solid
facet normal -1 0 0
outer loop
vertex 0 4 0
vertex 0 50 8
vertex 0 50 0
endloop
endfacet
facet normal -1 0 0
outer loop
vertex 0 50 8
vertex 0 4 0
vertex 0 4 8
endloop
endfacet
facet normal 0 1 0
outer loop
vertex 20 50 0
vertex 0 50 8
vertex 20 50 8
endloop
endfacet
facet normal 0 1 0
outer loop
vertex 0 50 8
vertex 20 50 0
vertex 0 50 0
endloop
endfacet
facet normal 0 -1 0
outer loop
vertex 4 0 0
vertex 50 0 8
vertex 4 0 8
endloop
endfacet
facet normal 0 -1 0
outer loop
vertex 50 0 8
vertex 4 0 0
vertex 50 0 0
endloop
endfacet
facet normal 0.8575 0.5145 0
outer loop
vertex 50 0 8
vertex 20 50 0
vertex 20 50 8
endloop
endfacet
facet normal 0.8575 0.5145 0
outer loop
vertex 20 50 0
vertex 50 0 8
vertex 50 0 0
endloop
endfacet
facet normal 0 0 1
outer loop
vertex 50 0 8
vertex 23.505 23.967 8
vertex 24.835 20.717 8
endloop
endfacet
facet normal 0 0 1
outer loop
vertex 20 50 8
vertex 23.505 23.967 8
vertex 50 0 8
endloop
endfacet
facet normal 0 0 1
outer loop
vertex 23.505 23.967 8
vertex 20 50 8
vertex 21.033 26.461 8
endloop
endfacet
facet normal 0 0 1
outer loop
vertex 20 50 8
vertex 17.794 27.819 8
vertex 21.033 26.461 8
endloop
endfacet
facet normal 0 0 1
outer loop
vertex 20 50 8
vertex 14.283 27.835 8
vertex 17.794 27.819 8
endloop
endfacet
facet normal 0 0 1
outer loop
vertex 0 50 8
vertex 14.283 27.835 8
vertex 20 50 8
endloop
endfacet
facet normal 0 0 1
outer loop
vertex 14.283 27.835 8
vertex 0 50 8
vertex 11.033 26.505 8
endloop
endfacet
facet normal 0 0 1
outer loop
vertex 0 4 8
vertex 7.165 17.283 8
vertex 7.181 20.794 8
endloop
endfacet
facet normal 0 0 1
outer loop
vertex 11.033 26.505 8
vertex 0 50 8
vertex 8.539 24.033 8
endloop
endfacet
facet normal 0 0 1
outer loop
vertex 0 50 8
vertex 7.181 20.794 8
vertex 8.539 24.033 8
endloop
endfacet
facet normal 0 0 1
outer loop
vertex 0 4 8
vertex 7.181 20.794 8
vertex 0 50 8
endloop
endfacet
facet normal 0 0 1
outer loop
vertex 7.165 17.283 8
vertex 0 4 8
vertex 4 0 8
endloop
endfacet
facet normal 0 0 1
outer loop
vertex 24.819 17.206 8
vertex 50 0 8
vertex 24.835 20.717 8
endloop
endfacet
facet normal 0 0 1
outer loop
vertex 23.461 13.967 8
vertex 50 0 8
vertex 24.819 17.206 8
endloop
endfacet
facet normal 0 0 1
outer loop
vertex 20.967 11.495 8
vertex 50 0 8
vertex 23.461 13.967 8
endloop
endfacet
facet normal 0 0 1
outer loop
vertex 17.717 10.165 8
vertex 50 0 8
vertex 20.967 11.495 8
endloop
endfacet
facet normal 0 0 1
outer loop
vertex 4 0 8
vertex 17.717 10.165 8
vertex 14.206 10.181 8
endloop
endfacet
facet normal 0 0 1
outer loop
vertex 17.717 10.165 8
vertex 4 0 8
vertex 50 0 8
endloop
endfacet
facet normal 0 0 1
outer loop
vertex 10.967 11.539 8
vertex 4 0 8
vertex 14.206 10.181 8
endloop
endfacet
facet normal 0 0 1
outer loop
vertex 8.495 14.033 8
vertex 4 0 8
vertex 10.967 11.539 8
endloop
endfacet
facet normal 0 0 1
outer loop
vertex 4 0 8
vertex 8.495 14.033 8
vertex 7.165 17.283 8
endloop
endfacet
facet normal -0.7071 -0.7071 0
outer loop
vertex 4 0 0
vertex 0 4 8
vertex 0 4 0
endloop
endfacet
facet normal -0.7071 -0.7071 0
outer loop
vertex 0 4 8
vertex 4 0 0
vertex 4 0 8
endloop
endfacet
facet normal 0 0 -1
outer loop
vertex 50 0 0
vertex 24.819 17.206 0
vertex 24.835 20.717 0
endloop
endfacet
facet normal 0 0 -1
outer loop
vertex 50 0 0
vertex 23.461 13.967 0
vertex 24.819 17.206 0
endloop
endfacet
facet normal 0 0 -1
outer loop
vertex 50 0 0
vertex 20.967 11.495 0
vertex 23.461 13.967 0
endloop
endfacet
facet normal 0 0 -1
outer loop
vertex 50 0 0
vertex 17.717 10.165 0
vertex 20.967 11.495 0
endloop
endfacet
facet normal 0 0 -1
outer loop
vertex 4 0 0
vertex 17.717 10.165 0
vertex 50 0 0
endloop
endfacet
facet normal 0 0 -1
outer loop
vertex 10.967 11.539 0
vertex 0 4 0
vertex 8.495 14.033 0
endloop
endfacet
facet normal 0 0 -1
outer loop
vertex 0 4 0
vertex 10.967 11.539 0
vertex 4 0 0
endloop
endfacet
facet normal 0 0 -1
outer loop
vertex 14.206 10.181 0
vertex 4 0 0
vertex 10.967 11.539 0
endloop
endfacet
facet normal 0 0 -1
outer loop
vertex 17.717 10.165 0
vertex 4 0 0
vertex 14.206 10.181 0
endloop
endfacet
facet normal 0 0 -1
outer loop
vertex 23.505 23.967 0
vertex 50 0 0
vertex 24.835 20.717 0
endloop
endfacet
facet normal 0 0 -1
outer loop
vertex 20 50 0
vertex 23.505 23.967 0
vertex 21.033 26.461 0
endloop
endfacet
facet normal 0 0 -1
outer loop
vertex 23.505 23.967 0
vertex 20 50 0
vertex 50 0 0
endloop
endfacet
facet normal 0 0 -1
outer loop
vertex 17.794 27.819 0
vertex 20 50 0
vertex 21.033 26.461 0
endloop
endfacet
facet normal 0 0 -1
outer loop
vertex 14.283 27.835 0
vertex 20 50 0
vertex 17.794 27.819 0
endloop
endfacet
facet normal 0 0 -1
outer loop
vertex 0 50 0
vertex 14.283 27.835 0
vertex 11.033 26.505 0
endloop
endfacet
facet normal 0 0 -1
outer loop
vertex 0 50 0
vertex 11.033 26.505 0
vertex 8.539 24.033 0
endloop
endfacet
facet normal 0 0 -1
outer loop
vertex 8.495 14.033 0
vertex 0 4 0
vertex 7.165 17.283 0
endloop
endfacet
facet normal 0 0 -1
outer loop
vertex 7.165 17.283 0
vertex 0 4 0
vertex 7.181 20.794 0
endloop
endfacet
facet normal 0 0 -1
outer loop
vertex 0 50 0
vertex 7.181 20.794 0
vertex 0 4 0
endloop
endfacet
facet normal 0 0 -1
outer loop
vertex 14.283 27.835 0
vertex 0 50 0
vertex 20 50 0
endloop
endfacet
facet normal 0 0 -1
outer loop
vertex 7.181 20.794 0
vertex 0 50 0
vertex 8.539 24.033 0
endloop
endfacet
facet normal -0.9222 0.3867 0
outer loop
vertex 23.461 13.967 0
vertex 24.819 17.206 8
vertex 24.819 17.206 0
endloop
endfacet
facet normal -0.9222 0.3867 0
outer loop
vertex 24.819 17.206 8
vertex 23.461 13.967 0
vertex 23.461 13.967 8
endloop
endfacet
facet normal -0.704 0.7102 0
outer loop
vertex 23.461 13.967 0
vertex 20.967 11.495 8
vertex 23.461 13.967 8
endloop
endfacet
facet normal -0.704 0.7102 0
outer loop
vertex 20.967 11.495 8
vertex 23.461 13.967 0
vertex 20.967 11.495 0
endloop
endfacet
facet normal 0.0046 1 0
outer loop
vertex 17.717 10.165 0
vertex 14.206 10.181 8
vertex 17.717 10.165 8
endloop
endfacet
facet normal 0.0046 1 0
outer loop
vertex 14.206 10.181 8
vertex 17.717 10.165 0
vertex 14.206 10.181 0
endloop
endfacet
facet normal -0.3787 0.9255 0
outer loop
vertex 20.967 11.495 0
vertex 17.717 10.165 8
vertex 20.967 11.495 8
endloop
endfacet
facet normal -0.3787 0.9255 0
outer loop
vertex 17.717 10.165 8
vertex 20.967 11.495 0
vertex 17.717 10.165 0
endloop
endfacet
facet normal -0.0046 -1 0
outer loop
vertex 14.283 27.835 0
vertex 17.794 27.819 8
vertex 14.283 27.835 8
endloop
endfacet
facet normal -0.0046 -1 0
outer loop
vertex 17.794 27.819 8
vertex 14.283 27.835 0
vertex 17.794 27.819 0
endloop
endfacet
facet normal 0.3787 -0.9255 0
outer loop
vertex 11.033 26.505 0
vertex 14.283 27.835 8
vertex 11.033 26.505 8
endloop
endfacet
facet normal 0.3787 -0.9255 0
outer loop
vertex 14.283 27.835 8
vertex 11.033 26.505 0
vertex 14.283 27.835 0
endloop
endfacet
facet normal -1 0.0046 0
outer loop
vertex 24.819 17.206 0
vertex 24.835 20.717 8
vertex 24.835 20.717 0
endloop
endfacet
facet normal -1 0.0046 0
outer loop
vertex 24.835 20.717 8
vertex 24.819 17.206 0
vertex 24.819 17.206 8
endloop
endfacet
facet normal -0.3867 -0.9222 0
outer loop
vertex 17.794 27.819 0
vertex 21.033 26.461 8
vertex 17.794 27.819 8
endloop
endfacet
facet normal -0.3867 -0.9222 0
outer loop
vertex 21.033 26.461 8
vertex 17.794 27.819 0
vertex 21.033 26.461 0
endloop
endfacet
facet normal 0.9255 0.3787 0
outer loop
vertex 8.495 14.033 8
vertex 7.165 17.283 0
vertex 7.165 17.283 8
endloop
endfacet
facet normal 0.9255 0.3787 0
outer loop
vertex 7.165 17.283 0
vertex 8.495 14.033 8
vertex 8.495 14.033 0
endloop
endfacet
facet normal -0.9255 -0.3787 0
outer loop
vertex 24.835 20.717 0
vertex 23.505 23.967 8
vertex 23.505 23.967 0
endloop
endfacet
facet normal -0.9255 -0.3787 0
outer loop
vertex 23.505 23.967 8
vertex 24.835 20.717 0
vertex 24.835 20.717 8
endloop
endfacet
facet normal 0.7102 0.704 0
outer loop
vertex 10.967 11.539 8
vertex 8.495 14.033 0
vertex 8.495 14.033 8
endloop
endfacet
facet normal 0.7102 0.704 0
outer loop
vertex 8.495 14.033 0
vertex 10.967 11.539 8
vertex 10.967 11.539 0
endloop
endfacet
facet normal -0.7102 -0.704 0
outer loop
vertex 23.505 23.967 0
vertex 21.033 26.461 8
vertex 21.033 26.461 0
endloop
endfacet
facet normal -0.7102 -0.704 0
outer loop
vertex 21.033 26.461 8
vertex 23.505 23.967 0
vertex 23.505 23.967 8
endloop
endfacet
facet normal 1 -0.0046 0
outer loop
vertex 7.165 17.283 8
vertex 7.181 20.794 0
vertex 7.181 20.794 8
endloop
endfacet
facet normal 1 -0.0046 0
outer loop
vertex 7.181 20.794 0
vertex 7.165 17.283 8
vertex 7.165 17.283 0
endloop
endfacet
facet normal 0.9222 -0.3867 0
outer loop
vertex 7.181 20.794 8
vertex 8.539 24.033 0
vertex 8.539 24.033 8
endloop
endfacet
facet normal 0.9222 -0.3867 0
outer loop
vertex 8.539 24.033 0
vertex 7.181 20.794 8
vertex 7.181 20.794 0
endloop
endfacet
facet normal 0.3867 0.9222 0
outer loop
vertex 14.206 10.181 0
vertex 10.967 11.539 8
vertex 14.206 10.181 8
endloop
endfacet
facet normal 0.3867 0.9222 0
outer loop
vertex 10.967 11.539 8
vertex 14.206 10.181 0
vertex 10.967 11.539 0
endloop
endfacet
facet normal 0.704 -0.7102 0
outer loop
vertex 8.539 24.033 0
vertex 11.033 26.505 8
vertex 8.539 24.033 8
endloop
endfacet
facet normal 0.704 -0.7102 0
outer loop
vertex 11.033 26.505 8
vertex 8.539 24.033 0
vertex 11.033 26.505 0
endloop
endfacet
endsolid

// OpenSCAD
$fn = 32;

// ----------------------------------------------------------------------
// Bracket plate: gusset 50 x 50
// ----------------------------------------------------------------------

// --- parameters (mm) ---
hole_r = 4;               // bolt hole radius
plate_t = 8;              // plate thickness, Z (extrusion height)
gus_a = 50;               // base length
gus_b = 50;               // height
top_x = 20;               // top edge X of the angled cut
light_r = 9;              // lightening hole radius

light_d = 2 * light_r;

profile = [[4, 0], [25, 0], [50, 0], [20, 50], [0, 50], [0, 4]];  // primary outline, 6 points, counter clockwise
void_1 = [[24.835, 20.717], [23.505, 23.967], [21.033, 26.461], [17.794, 27.819], [14.283, 27.835], [11.033, 26.505], [8.539, 24.033], [7.181, 20.794], [7.165, 17.283], [8.495, 14.033], [10.967, 11.539], [14.206, 10.181], [17.717, 10.165], [20.967, 11.495], [23.461, 13.967], [24.819, 17.206]];  // lightening hole, 16 points

// --- the one profile operation ---
difference() {
  linear_extrude(height = plate_t) polygon(points = profile);
  translate([0, 0, -1])
    linear_extrude(height = plate_t + 2) polygon(points = void_1);
}
